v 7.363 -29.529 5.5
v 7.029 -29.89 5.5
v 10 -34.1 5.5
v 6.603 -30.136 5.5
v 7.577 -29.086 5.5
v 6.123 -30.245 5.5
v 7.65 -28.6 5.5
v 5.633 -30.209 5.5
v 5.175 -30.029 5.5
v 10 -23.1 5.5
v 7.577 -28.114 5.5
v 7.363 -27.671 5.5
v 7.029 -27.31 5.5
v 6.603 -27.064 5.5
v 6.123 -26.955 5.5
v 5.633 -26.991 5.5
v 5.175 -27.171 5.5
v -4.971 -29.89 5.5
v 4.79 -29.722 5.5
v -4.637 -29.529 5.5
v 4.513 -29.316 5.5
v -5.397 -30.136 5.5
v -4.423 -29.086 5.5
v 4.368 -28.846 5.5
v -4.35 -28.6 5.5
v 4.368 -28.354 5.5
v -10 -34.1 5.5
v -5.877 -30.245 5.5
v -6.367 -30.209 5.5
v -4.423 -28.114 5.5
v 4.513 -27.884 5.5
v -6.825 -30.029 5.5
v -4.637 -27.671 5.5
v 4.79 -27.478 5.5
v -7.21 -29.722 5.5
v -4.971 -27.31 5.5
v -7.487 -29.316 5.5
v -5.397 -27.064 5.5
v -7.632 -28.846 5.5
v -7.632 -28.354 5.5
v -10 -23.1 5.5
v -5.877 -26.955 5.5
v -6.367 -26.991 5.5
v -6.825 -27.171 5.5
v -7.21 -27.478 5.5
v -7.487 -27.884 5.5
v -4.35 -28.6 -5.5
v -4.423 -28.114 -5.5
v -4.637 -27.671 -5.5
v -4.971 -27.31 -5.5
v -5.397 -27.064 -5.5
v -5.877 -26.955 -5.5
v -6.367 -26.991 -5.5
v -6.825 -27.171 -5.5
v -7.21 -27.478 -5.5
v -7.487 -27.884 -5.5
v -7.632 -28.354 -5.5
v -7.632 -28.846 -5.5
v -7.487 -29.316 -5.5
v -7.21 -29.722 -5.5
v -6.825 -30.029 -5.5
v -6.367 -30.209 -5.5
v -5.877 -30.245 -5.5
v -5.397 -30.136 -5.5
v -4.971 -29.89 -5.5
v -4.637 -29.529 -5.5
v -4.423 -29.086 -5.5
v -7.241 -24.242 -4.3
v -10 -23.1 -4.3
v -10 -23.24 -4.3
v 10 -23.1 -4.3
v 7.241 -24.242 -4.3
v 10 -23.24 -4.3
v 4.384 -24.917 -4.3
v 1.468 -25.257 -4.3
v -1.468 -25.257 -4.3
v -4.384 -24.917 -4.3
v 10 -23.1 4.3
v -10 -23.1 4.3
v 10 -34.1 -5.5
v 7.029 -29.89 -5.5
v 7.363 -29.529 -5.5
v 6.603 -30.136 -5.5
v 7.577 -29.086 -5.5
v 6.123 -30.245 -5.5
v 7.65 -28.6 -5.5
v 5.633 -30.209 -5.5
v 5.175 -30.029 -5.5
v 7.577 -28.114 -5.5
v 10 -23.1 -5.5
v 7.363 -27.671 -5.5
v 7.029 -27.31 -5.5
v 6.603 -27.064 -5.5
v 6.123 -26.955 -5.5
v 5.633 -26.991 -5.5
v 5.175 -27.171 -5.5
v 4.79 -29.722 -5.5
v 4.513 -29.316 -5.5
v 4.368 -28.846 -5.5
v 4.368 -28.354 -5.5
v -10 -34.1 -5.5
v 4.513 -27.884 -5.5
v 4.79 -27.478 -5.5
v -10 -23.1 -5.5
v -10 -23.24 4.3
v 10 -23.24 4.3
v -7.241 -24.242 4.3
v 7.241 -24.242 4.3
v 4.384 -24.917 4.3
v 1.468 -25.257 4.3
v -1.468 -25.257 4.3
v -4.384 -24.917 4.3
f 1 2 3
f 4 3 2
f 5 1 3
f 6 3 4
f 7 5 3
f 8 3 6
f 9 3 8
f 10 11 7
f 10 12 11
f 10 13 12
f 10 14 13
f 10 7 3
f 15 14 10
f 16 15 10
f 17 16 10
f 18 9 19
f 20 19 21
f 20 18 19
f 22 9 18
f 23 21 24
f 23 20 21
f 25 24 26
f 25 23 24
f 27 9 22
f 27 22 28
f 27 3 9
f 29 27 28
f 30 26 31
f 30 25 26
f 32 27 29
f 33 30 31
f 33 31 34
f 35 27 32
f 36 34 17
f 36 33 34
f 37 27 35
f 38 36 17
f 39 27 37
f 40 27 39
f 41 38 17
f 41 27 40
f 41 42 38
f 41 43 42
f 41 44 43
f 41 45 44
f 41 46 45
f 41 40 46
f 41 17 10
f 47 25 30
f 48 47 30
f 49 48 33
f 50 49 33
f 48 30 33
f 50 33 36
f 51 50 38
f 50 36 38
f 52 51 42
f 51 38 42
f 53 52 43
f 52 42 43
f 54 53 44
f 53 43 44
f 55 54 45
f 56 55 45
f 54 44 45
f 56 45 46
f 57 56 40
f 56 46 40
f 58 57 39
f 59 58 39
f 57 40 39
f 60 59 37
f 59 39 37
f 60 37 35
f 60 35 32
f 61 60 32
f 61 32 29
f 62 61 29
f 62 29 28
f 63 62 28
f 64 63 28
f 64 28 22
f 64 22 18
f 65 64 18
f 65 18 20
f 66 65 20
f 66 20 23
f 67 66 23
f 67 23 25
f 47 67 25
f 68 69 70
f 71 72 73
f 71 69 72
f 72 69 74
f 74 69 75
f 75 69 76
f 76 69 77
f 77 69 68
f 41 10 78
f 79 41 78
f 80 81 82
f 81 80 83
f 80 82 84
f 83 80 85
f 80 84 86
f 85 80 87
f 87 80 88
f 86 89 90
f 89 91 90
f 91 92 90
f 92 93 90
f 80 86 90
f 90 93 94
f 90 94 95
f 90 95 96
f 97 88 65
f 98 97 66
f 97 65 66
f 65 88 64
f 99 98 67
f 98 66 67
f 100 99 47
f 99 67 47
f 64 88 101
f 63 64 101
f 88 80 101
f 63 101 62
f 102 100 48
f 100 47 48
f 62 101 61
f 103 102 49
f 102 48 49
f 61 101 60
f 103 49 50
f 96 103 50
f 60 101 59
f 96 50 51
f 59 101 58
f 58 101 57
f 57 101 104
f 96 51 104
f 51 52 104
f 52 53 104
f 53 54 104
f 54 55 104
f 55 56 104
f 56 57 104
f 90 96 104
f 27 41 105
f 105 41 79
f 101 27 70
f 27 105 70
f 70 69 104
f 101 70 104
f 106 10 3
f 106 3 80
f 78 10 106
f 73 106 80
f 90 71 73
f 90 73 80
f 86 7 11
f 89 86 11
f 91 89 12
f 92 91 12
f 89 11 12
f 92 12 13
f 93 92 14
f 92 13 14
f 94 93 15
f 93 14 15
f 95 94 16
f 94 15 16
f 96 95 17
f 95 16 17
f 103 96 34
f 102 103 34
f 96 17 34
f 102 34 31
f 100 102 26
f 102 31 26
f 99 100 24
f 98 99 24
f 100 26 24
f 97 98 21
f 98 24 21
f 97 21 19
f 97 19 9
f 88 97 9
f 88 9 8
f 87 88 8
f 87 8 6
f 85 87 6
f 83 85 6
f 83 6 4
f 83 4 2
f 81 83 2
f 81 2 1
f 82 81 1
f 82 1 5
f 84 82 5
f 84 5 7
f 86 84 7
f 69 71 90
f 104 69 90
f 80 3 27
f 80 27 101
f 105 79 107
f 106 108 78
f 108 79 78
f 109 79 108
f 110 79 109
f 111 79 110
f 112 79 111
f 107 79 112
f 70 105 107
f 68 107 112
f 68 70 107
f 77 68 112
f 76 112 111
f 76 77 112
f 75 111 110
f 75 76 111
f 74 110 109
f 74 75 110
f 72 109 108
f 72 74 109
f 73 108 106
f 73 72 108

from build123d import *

# Parameters (mm, degrees)
BOSS_EXTRUDE1_DEPTH           = 10
BOSS_EXTRUDE1_DEPTH_BACK      = 10
SKETCH1_W                     = 11
SKETCH1_H                     = 11
SKETCH3_R                     = 1.65
M4_THREADED_3_3_MM_THRU_DEPTH = 38.199596772
CUT_EXTRUDE1_DEPTH            = 4.3
CUT_EXTRUDE1_DEPTH_BACK       = 4.3
SKETCH4_R                     = 25.3


with BuildPart() as part:
    # Sketch1 → Boss-Extrude1 (new, two sides: drawn at the far end of the back side and taken through both)
    with BuildSketch(Plane(origin=(0, 0, 0), x_dir=(0, 0, -1), z_dir=(1, 0, 0)).offset(-BOSS_EXTRUDE1_DEPTH_BACK)):
        with Locations((0, -28.6)):
            Rectangle(SKETCH1_W, SKETCH1_H)
    extrude(amount=BOSS_EXTRUDE1_DEPTH + BOSS_EXTRUDE1_DEPTH_BACK)

    # Sketch3 → M4 threaded 3.3 mm-thru (cut, through all)
    with BuildSketch(Plane.XY.offset(5.5)):
        with Locations((6, -28.6)):
            Circle(SKETCH3_R)
        with Locations((-6, -28.6)):
            Circle(SKETCH3_R)
    extrude(amount=-M4_THREADED_3_3_MM_THRU_DEPTH, mode=Mode.SUBTRACT)

    # Sketch4 → Cut-Extrude1 (cut, two sides: drawn at the far end of the back side and taken through both)
    with BuildSketch(Plane.XY.offset(-CUT_EXTRUDE1_DEPTH_BACK)):
        Circle(SKETCH4_R)
    extrude(amount=CUT_EXTRUDE1_DEPTH + CUT_EXTRUDE1_DEPTH_BACK, mode=Mode.SUBTRACT)


solid = part.part
